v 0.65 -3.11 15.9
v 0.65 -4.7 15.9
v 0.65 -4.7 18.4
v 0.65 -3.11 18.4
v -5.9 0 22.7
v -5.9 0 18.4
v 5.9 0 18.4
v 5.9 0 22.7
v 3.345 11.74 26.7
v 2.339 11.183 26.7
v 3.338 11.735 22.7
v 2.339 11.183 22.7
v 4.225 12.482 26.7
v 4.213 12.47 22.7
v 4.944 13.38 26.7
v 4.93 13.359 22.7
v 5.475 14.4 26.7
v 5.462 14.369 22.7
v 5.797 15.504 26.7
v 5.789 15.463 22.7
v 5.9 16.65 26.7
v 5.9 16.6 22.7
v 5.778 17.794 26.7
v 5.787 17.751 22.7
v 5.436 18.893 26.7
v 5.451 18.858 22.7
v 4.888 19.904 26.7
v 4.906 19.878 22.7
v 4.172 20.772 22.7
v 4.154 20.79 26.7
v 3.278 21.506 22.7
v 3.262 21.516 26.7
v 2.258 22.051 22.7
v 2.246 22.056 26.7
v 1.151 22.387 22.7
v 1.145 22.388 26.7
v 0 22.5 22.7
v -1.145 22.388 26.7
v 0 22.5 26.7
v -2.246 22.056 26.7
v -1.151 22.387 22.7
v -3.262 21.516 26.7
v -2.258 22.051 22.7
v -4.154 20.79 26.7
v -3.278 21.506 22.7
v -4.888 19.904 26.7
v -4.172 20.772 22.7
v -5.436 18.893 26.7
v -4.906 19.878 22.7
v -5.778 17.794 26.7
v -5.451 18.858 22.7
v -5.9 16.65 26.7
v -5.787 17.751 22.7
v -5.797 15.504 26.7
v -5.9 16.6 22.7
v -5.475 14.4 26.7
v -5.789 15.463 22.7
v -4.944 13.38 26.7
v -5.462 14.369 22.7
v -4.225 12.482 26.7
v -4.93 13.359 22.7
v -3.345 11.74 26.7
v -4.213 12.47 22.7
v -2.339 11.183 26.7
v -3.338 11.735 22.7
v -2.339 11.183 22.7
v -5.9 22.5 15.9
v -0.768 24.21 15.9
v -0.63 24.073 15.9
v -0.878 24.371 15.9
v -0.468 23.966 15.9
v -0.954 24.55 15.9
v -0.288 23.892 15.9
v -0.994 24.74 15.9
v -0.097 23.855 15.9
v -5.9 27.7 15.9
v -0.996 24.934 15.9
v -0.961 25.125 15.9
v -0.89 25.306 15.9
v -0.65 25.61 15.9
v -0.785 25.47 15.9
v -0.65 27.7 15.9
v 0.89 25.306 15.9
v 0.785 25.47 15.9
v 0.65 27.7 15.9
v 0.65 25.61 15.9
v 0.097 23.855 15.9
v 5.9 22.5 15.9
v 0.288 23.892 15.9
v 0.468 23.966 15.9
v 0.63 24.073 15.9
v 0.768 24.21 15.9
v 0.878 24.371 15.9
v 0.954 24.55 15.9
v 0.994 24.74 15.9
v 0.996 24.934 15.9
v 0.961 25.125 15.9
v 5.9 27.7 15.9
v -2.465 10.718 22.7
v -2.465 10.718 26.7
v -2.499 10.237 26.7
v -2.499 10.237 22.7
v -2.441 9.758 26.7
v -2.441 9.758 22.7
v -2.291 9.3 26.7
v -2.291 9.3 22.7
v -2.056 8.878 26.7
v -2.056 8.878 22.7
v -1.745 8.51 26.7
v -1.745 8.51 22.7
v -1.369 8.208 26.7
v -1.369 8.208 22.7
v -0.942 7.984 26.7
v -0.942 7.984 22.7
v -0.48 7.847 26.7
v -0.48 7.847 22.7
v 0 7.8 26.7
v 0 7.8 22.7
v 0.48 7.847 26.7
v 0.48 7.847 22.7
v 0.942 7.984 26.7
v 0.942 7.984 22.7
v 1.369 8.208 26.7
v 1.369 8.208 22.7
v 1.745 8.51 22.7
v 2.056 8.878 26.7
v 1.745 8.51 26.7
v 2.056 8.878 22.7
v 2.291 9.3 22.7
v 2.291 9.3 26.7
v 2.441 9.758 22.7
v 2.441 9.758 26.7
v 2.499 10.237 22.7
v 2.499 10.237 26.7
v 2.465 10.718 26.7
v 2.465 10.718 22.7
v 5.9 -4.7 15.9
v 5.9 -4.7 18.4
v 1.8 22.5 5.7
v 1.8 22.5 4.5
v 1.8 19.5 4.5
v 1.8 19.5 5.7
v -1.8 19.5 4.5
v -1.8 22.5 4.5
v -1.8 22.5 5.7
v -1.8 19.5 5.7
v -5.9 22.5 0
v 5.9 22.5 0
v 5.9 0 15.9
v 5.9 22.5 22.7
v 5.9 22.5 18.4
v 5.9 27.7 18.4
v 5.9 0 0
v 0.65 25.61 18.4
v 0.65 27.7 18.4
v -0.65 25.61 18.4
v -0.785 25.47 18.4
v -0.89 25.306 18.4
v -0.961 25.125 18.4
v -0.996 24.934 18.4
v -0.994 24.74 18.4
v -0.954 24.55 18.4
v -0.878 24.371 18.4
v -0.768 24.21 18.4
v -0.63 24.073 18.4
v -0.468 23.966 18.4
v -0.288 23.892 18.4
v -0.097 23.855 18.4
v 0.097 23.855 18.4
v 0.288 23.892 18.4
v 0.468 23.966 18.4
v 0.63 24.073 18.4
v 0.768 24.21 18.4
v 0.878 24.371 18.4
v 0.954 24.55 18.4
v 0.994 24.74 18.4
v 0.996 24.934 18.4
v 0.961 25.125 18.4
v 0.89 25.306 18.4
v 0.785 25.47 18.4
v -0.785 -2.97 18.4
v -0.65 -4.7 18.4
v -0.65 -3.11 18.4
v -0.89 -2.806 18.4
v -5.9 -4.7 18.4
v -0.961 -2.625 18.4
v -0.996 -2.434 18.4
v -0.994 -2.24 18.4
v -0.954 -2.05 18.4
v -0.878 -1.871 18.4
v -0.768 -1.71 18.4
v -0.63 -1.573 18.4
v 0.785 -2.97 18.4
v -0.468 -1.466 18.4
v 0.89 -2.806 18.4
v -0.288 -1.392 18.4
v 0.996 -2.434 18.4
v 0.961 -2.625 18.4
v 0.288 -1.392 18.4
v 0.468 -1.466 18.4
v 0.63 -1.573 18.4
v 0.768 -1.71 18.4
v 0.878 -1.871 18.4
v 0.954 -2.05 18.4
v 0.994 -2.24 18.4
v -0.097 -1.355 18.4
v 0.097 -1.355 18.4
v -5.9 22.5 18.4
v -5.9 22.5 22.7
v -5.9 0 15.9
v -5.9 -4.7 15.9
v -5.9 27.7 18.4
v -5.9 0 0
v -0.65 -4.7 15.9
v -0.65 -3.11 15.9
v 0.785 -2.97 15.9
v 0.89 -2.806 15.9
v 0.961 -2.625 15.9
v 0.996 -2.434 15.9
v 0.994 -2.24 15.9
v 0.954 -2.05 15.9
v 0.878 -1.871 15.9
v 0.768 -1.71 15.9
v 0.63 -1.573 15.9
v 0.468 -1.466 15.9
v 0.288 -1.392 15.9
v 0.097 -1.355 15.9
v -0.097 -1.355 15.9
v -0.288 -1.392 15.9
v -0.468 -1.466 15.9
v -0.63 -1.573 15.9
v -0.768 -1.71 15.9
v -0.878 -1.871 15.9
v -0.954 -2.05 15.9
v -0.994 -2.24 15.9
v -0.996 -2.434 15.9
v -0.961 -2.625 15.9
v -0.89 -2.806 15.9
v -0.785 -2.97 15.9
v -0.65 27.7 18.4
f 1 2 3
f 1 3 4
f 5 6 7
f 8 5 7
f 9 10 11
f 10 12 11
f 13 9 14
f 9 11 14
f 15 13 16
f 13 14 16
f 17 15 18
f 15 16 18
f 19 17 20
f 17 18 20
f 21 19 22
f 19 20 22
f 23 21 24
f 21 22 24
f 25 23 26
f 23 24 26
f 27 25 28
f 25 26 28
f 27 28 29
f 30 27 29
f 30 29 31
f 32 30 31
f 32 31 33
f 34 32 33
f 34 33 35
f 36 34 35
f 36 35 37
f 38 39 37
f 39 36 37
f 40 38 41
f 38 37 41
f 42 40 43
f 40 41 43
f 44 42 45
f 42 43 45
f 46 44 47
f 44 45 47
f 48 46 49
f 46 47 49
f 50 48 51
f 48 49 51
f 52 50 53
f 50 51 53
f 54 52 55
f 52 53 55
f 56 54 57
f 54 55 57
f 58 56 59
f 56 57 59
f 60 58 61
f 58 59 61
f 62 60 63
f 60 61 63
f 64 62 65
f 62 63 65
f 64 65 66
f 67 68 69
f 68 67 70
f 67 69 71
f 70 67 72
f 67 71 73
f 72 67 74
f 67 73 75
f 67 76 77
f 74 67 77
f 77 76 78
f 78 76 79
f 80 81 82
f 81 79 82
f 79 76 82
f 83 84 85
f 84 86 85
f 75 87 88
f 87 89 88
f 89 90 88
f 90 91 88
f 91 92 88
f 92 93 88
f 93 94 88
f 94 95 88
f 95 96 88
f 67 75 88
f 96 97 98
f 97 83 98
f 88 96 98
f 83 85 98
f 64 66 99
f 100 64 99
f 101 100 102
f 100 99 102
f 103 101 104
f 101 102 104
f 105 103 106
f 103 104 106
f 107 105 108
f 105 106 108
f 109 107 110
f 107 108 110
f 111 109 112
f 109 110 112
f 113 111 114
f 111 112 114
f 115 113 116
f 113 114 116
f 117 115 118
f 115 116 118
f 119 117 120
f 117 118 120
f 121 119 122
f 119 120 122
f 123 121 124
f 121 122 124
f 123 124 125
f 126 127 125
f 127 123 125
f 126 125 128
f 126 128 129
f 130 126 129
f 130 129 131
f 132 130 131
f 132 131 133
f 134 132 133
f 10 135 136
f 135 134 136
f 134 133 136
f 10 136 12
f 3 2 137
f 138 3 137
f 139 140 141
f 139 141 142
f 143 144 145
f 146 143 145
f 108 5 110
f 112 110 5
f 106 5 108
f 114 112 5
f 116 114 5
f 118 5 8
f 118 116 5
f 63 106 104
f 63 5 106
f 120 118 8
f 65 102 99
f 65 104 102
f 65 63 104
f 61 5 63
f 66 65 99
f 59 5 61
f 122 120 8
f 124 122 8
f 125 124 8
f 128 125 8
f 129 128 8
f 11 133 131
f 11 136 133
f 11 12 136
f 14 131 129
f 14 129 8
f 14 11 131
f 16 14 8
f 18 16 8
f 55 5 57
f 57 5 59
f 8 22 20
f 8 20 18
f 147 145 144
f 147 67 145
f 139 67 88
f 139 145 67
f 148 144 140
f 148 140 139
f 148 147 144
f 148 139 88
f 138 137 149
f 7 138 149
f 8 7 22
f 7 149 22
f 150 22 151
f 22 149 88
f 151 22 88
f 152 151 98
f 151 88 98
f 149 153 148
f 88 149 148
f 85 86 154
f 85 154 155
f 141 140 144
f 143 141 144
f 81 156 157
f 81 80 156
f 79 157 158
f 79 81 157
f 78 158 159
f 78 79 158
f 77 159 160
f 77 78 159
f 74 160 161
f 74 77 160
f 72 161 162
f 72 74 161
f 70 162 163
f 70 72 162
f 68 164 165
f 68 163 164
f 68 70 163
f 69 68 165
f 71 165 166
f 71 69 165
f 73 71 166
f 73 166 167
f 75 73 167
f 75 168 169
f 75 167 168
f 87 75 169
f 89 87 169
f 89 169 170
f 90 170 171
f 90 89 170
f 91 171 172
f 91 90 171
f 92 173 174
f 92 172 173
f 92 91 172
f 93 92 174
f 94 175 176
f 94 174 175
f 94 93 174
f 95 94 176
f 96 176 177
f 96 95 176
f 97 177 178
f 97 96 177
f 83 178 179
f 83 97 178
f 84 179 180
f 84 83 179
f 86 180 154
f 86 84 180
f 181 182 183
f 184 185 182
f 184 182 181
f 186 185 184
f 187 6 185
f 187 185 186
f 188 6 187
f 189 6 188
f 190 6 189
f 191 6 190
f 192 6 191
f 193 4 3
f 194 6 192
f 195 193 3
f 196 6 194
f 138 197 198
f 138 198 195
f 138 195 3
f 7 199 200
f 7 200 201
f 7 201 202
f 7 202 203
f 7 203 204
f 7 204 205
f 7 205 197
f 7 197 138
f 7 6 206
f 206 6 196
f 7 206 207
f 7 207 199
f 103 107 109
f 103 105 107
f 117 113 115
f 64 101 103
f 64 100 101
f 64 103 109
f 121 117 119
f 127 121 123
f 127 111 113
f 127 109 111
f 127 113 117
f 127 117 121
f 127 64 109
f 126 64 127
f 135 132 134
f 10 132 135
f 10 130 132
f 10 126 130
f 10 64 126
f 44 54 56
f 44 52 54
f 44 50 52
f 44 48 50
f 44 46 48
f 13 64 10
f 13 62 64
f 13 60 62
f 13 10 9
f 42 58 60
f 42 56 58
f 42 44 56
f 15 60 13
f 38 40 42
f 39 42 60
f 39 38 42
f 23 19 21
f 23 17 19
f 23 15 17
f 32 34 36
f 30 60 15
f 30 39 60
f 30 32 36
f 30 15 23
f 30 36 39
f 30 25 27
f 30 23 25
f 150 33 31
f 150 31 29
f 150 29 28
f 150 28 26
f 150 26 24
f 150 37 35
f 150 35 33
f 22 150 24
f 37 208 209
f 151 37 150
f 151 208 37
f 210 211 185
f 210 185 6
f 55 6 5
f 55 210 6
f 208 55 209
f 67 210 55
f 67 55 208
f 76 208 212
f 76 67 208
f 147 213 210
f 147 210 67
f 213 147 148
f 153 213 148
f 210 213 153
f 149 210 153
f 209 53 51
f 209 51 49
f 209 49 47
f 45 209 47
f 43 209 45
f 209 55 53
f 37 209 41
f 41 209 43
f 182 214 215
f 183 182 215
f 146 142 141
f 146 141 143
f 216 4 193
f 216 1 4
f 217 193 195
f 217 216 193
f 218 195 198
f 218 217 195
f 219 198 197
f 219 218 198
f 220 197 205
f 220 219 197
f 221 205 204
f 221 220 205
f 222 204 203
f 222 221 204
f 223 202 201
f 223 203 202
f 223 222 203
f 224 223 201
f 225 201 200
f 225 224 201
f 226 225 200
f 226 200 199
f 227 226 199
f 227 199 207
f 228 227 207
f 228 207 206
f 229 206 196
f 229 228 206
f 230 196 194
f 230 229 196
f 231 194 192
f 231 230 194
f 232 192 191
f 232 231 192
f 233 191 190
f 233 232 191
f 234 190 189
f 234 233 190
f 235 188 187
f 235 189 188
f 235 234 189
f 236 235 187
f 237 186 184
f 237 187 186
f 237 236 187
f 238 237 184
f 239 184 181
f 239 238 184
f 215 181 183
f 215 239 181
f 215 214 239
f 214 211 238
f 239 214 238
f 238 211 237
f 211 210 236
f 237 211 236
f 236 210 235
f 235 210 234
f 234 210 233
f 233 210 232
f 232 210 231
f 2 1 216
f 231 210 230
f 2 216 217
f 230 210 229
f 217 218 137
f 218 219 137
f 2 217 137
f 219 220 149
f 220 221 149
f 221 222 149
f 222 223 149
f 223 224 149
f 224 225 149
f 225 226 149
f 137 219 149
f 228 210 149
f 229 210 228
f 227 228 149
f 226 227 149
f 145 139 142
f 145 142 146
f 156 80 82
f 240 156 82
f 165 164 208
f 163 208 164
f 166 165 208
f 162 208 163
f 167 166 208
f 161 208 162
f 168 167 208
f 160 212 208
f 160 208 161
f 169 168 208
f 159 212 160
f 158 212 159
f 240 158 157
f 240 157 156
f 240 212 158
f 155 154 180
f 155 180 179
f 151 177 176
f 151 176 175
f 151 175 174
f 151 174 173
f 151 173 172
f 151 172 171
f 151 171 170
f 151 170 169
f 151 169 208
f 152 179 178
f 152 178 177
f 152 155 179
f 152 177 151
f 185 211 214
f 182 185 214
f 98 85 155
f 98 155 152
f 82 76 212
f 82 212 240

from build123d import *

# Parameters (mm, degrees)
BOX003_W          = 1.3
BOX003_H          = 3.3
BOX003_DEPTH      = 10
BOX002_W          = 1.3
BOX002_H          = 3.3
BOX002_DEPTH      = 10
CYLINDER004_R     = 1
CYLINDER004_DEPTH = 10
CYLINDER003_R     = 1
CYLINDER003_DEPTH = 10
CYLINDER001_R     = 2.5
CYLINDER001_DEPTH = 4
CYLINDER_R        = 5.9
CYLINDER_DEPTH    = 4
BOX001_W          = 11.8
BOX001_H          = 32.4
BOX001_DEPTH      = 2.5
BOX_W             = 11.8
BOX_H             = 22.5
BOX_DEPTH         = 22.7
SKETCH005_W       = 3.6
SKETCH005_H       = 1.2
POCKET001_DEPTH   = 3


with BuildPart() as cubo003:
    # Box003 → Box003 (new body)
    with BuildSketch(Plane(origin=(5.25, 25, 12), x_dir=(1, 0, 0), z_dir=(0, 0, 1))):
        with Locations((0.65, 1.65)):
            Rectangle(BOX003_W, BOX003_H)
    extrude(amount=BOX003_DEPTH)


with BuildPart() as rebajes:
    # Box002 → Box002 (new body)
    with BuildSketch(Plane(origin=(5.25, -6, 12), x_dir=(1, 0, 0), z_dir=(0, 0, 1))):
        with Locations((0.65, 1.65)):
            Rectangle(BOX002_W, BOX002_H)
    extrude(amount=BOX002_DEPTH)

    # Fusion005: union Cubo003
    add(cubo003.part)


with BuildPart() as taladro2:
    # Cylinder004 → Cylinder004 (new body)
    with BuildSketch(Plane(origin=(5.9, 24.85, 11), x_dir=(1, 0, 0), z_dir=(0, 0, 1))):
        Circle(CYLINDER004_R)
    extrude(amount=CYLINDER004_DEPTH)


with BuildPart() as taladros001:
    # Cylinder003 → Cylinder003 (new body)
    with BuildSketch(Plane(origin=(5.9, -2.35, 11), x_dir=(1, 0, 0), z_dir=(0, 0, 1))):
        Circle(CYLINDER003_R)
    extrude(amount=CYLINDER003_DEPTH)

    # Fusion004: union Taladro2
    add(taladro2.part)

    # Fusion006: union Rebajes
    add(rebajes.part)


with BuildPart() as cilindro001:
    # Cylinder001 → Cylinder001 (new body)
    with BuildSketch(Plane(origin=(5.9, 10.3, 22.7), x_dir=(1, 0, 0), z_dir=(0, 0, 1))):
        Circle(CYLINDER001_R)
    extrude(amount=CYLINDER001_DEPTH)


with BuildPart() as fusion001:
    # Cylinder → Cylinder (new body)
    with BuildSketch(Plane(origin=(5.9, 16.6, 22.7), x_dir=(1, 0, 0), z_dir=(0, 0, 1))):
        Circle(CYLINDER_R)
    extrude(amount=CYLINDER_DEPTH)

    # Fusion001: union Cilindro001
    add(cilindro001.part)


with BuildPart() as cubo001:
    # Box001 → Box001 (new body)
    with BuildSketch(Plane(origin=(0, -4.7, 15.9), x_dir=(1, 0, 0), z_dir=(0, 0, 1))):
        with Locations((5.9, 16.2)):
            Rectangle(BOX001_W, BOX001_H)
    extrude(amount=BOX001_DEPTH)


with BuildPart() as ranura_cable:
    # Box → Box (new body)
    with BuildSketch(Plane.XY):
        with Locations((5.9, 11.25)):
            Rectangle(BOX_W, BOX_H)
    extrude(amount=BOX_DEPTH)

    # Fusion: union Cubo001
    add(cubo001.part)

    # Fusion003: union Fusion001
    add(fusion001.part)

    # Cut: cut Taladros001
    add(taladros001.part, mode=Mode.SUBTRACT)


with BuildPart() as ranura_cable_1:
    # Cut placement: moved
    add(ranura_cable.part.moved(Location((-5.9, 0, 0))))

    # Sketch005 → Pocket001 (cut)
    with BuildSketch(Plane(origin=(-5.9, 22.5, 0), x_dir=(-1, 0, 0), z_dir=(0, 1, 0))):
        with Locations((-5.9, 5.1)):
            Rectangle(SKETCH005_W, SKETCH005_H)
    extrude(amount=-POCKET001_DEPTH, mode=Mode.SUBTRACT)


solid = ranura_cable_1.part
